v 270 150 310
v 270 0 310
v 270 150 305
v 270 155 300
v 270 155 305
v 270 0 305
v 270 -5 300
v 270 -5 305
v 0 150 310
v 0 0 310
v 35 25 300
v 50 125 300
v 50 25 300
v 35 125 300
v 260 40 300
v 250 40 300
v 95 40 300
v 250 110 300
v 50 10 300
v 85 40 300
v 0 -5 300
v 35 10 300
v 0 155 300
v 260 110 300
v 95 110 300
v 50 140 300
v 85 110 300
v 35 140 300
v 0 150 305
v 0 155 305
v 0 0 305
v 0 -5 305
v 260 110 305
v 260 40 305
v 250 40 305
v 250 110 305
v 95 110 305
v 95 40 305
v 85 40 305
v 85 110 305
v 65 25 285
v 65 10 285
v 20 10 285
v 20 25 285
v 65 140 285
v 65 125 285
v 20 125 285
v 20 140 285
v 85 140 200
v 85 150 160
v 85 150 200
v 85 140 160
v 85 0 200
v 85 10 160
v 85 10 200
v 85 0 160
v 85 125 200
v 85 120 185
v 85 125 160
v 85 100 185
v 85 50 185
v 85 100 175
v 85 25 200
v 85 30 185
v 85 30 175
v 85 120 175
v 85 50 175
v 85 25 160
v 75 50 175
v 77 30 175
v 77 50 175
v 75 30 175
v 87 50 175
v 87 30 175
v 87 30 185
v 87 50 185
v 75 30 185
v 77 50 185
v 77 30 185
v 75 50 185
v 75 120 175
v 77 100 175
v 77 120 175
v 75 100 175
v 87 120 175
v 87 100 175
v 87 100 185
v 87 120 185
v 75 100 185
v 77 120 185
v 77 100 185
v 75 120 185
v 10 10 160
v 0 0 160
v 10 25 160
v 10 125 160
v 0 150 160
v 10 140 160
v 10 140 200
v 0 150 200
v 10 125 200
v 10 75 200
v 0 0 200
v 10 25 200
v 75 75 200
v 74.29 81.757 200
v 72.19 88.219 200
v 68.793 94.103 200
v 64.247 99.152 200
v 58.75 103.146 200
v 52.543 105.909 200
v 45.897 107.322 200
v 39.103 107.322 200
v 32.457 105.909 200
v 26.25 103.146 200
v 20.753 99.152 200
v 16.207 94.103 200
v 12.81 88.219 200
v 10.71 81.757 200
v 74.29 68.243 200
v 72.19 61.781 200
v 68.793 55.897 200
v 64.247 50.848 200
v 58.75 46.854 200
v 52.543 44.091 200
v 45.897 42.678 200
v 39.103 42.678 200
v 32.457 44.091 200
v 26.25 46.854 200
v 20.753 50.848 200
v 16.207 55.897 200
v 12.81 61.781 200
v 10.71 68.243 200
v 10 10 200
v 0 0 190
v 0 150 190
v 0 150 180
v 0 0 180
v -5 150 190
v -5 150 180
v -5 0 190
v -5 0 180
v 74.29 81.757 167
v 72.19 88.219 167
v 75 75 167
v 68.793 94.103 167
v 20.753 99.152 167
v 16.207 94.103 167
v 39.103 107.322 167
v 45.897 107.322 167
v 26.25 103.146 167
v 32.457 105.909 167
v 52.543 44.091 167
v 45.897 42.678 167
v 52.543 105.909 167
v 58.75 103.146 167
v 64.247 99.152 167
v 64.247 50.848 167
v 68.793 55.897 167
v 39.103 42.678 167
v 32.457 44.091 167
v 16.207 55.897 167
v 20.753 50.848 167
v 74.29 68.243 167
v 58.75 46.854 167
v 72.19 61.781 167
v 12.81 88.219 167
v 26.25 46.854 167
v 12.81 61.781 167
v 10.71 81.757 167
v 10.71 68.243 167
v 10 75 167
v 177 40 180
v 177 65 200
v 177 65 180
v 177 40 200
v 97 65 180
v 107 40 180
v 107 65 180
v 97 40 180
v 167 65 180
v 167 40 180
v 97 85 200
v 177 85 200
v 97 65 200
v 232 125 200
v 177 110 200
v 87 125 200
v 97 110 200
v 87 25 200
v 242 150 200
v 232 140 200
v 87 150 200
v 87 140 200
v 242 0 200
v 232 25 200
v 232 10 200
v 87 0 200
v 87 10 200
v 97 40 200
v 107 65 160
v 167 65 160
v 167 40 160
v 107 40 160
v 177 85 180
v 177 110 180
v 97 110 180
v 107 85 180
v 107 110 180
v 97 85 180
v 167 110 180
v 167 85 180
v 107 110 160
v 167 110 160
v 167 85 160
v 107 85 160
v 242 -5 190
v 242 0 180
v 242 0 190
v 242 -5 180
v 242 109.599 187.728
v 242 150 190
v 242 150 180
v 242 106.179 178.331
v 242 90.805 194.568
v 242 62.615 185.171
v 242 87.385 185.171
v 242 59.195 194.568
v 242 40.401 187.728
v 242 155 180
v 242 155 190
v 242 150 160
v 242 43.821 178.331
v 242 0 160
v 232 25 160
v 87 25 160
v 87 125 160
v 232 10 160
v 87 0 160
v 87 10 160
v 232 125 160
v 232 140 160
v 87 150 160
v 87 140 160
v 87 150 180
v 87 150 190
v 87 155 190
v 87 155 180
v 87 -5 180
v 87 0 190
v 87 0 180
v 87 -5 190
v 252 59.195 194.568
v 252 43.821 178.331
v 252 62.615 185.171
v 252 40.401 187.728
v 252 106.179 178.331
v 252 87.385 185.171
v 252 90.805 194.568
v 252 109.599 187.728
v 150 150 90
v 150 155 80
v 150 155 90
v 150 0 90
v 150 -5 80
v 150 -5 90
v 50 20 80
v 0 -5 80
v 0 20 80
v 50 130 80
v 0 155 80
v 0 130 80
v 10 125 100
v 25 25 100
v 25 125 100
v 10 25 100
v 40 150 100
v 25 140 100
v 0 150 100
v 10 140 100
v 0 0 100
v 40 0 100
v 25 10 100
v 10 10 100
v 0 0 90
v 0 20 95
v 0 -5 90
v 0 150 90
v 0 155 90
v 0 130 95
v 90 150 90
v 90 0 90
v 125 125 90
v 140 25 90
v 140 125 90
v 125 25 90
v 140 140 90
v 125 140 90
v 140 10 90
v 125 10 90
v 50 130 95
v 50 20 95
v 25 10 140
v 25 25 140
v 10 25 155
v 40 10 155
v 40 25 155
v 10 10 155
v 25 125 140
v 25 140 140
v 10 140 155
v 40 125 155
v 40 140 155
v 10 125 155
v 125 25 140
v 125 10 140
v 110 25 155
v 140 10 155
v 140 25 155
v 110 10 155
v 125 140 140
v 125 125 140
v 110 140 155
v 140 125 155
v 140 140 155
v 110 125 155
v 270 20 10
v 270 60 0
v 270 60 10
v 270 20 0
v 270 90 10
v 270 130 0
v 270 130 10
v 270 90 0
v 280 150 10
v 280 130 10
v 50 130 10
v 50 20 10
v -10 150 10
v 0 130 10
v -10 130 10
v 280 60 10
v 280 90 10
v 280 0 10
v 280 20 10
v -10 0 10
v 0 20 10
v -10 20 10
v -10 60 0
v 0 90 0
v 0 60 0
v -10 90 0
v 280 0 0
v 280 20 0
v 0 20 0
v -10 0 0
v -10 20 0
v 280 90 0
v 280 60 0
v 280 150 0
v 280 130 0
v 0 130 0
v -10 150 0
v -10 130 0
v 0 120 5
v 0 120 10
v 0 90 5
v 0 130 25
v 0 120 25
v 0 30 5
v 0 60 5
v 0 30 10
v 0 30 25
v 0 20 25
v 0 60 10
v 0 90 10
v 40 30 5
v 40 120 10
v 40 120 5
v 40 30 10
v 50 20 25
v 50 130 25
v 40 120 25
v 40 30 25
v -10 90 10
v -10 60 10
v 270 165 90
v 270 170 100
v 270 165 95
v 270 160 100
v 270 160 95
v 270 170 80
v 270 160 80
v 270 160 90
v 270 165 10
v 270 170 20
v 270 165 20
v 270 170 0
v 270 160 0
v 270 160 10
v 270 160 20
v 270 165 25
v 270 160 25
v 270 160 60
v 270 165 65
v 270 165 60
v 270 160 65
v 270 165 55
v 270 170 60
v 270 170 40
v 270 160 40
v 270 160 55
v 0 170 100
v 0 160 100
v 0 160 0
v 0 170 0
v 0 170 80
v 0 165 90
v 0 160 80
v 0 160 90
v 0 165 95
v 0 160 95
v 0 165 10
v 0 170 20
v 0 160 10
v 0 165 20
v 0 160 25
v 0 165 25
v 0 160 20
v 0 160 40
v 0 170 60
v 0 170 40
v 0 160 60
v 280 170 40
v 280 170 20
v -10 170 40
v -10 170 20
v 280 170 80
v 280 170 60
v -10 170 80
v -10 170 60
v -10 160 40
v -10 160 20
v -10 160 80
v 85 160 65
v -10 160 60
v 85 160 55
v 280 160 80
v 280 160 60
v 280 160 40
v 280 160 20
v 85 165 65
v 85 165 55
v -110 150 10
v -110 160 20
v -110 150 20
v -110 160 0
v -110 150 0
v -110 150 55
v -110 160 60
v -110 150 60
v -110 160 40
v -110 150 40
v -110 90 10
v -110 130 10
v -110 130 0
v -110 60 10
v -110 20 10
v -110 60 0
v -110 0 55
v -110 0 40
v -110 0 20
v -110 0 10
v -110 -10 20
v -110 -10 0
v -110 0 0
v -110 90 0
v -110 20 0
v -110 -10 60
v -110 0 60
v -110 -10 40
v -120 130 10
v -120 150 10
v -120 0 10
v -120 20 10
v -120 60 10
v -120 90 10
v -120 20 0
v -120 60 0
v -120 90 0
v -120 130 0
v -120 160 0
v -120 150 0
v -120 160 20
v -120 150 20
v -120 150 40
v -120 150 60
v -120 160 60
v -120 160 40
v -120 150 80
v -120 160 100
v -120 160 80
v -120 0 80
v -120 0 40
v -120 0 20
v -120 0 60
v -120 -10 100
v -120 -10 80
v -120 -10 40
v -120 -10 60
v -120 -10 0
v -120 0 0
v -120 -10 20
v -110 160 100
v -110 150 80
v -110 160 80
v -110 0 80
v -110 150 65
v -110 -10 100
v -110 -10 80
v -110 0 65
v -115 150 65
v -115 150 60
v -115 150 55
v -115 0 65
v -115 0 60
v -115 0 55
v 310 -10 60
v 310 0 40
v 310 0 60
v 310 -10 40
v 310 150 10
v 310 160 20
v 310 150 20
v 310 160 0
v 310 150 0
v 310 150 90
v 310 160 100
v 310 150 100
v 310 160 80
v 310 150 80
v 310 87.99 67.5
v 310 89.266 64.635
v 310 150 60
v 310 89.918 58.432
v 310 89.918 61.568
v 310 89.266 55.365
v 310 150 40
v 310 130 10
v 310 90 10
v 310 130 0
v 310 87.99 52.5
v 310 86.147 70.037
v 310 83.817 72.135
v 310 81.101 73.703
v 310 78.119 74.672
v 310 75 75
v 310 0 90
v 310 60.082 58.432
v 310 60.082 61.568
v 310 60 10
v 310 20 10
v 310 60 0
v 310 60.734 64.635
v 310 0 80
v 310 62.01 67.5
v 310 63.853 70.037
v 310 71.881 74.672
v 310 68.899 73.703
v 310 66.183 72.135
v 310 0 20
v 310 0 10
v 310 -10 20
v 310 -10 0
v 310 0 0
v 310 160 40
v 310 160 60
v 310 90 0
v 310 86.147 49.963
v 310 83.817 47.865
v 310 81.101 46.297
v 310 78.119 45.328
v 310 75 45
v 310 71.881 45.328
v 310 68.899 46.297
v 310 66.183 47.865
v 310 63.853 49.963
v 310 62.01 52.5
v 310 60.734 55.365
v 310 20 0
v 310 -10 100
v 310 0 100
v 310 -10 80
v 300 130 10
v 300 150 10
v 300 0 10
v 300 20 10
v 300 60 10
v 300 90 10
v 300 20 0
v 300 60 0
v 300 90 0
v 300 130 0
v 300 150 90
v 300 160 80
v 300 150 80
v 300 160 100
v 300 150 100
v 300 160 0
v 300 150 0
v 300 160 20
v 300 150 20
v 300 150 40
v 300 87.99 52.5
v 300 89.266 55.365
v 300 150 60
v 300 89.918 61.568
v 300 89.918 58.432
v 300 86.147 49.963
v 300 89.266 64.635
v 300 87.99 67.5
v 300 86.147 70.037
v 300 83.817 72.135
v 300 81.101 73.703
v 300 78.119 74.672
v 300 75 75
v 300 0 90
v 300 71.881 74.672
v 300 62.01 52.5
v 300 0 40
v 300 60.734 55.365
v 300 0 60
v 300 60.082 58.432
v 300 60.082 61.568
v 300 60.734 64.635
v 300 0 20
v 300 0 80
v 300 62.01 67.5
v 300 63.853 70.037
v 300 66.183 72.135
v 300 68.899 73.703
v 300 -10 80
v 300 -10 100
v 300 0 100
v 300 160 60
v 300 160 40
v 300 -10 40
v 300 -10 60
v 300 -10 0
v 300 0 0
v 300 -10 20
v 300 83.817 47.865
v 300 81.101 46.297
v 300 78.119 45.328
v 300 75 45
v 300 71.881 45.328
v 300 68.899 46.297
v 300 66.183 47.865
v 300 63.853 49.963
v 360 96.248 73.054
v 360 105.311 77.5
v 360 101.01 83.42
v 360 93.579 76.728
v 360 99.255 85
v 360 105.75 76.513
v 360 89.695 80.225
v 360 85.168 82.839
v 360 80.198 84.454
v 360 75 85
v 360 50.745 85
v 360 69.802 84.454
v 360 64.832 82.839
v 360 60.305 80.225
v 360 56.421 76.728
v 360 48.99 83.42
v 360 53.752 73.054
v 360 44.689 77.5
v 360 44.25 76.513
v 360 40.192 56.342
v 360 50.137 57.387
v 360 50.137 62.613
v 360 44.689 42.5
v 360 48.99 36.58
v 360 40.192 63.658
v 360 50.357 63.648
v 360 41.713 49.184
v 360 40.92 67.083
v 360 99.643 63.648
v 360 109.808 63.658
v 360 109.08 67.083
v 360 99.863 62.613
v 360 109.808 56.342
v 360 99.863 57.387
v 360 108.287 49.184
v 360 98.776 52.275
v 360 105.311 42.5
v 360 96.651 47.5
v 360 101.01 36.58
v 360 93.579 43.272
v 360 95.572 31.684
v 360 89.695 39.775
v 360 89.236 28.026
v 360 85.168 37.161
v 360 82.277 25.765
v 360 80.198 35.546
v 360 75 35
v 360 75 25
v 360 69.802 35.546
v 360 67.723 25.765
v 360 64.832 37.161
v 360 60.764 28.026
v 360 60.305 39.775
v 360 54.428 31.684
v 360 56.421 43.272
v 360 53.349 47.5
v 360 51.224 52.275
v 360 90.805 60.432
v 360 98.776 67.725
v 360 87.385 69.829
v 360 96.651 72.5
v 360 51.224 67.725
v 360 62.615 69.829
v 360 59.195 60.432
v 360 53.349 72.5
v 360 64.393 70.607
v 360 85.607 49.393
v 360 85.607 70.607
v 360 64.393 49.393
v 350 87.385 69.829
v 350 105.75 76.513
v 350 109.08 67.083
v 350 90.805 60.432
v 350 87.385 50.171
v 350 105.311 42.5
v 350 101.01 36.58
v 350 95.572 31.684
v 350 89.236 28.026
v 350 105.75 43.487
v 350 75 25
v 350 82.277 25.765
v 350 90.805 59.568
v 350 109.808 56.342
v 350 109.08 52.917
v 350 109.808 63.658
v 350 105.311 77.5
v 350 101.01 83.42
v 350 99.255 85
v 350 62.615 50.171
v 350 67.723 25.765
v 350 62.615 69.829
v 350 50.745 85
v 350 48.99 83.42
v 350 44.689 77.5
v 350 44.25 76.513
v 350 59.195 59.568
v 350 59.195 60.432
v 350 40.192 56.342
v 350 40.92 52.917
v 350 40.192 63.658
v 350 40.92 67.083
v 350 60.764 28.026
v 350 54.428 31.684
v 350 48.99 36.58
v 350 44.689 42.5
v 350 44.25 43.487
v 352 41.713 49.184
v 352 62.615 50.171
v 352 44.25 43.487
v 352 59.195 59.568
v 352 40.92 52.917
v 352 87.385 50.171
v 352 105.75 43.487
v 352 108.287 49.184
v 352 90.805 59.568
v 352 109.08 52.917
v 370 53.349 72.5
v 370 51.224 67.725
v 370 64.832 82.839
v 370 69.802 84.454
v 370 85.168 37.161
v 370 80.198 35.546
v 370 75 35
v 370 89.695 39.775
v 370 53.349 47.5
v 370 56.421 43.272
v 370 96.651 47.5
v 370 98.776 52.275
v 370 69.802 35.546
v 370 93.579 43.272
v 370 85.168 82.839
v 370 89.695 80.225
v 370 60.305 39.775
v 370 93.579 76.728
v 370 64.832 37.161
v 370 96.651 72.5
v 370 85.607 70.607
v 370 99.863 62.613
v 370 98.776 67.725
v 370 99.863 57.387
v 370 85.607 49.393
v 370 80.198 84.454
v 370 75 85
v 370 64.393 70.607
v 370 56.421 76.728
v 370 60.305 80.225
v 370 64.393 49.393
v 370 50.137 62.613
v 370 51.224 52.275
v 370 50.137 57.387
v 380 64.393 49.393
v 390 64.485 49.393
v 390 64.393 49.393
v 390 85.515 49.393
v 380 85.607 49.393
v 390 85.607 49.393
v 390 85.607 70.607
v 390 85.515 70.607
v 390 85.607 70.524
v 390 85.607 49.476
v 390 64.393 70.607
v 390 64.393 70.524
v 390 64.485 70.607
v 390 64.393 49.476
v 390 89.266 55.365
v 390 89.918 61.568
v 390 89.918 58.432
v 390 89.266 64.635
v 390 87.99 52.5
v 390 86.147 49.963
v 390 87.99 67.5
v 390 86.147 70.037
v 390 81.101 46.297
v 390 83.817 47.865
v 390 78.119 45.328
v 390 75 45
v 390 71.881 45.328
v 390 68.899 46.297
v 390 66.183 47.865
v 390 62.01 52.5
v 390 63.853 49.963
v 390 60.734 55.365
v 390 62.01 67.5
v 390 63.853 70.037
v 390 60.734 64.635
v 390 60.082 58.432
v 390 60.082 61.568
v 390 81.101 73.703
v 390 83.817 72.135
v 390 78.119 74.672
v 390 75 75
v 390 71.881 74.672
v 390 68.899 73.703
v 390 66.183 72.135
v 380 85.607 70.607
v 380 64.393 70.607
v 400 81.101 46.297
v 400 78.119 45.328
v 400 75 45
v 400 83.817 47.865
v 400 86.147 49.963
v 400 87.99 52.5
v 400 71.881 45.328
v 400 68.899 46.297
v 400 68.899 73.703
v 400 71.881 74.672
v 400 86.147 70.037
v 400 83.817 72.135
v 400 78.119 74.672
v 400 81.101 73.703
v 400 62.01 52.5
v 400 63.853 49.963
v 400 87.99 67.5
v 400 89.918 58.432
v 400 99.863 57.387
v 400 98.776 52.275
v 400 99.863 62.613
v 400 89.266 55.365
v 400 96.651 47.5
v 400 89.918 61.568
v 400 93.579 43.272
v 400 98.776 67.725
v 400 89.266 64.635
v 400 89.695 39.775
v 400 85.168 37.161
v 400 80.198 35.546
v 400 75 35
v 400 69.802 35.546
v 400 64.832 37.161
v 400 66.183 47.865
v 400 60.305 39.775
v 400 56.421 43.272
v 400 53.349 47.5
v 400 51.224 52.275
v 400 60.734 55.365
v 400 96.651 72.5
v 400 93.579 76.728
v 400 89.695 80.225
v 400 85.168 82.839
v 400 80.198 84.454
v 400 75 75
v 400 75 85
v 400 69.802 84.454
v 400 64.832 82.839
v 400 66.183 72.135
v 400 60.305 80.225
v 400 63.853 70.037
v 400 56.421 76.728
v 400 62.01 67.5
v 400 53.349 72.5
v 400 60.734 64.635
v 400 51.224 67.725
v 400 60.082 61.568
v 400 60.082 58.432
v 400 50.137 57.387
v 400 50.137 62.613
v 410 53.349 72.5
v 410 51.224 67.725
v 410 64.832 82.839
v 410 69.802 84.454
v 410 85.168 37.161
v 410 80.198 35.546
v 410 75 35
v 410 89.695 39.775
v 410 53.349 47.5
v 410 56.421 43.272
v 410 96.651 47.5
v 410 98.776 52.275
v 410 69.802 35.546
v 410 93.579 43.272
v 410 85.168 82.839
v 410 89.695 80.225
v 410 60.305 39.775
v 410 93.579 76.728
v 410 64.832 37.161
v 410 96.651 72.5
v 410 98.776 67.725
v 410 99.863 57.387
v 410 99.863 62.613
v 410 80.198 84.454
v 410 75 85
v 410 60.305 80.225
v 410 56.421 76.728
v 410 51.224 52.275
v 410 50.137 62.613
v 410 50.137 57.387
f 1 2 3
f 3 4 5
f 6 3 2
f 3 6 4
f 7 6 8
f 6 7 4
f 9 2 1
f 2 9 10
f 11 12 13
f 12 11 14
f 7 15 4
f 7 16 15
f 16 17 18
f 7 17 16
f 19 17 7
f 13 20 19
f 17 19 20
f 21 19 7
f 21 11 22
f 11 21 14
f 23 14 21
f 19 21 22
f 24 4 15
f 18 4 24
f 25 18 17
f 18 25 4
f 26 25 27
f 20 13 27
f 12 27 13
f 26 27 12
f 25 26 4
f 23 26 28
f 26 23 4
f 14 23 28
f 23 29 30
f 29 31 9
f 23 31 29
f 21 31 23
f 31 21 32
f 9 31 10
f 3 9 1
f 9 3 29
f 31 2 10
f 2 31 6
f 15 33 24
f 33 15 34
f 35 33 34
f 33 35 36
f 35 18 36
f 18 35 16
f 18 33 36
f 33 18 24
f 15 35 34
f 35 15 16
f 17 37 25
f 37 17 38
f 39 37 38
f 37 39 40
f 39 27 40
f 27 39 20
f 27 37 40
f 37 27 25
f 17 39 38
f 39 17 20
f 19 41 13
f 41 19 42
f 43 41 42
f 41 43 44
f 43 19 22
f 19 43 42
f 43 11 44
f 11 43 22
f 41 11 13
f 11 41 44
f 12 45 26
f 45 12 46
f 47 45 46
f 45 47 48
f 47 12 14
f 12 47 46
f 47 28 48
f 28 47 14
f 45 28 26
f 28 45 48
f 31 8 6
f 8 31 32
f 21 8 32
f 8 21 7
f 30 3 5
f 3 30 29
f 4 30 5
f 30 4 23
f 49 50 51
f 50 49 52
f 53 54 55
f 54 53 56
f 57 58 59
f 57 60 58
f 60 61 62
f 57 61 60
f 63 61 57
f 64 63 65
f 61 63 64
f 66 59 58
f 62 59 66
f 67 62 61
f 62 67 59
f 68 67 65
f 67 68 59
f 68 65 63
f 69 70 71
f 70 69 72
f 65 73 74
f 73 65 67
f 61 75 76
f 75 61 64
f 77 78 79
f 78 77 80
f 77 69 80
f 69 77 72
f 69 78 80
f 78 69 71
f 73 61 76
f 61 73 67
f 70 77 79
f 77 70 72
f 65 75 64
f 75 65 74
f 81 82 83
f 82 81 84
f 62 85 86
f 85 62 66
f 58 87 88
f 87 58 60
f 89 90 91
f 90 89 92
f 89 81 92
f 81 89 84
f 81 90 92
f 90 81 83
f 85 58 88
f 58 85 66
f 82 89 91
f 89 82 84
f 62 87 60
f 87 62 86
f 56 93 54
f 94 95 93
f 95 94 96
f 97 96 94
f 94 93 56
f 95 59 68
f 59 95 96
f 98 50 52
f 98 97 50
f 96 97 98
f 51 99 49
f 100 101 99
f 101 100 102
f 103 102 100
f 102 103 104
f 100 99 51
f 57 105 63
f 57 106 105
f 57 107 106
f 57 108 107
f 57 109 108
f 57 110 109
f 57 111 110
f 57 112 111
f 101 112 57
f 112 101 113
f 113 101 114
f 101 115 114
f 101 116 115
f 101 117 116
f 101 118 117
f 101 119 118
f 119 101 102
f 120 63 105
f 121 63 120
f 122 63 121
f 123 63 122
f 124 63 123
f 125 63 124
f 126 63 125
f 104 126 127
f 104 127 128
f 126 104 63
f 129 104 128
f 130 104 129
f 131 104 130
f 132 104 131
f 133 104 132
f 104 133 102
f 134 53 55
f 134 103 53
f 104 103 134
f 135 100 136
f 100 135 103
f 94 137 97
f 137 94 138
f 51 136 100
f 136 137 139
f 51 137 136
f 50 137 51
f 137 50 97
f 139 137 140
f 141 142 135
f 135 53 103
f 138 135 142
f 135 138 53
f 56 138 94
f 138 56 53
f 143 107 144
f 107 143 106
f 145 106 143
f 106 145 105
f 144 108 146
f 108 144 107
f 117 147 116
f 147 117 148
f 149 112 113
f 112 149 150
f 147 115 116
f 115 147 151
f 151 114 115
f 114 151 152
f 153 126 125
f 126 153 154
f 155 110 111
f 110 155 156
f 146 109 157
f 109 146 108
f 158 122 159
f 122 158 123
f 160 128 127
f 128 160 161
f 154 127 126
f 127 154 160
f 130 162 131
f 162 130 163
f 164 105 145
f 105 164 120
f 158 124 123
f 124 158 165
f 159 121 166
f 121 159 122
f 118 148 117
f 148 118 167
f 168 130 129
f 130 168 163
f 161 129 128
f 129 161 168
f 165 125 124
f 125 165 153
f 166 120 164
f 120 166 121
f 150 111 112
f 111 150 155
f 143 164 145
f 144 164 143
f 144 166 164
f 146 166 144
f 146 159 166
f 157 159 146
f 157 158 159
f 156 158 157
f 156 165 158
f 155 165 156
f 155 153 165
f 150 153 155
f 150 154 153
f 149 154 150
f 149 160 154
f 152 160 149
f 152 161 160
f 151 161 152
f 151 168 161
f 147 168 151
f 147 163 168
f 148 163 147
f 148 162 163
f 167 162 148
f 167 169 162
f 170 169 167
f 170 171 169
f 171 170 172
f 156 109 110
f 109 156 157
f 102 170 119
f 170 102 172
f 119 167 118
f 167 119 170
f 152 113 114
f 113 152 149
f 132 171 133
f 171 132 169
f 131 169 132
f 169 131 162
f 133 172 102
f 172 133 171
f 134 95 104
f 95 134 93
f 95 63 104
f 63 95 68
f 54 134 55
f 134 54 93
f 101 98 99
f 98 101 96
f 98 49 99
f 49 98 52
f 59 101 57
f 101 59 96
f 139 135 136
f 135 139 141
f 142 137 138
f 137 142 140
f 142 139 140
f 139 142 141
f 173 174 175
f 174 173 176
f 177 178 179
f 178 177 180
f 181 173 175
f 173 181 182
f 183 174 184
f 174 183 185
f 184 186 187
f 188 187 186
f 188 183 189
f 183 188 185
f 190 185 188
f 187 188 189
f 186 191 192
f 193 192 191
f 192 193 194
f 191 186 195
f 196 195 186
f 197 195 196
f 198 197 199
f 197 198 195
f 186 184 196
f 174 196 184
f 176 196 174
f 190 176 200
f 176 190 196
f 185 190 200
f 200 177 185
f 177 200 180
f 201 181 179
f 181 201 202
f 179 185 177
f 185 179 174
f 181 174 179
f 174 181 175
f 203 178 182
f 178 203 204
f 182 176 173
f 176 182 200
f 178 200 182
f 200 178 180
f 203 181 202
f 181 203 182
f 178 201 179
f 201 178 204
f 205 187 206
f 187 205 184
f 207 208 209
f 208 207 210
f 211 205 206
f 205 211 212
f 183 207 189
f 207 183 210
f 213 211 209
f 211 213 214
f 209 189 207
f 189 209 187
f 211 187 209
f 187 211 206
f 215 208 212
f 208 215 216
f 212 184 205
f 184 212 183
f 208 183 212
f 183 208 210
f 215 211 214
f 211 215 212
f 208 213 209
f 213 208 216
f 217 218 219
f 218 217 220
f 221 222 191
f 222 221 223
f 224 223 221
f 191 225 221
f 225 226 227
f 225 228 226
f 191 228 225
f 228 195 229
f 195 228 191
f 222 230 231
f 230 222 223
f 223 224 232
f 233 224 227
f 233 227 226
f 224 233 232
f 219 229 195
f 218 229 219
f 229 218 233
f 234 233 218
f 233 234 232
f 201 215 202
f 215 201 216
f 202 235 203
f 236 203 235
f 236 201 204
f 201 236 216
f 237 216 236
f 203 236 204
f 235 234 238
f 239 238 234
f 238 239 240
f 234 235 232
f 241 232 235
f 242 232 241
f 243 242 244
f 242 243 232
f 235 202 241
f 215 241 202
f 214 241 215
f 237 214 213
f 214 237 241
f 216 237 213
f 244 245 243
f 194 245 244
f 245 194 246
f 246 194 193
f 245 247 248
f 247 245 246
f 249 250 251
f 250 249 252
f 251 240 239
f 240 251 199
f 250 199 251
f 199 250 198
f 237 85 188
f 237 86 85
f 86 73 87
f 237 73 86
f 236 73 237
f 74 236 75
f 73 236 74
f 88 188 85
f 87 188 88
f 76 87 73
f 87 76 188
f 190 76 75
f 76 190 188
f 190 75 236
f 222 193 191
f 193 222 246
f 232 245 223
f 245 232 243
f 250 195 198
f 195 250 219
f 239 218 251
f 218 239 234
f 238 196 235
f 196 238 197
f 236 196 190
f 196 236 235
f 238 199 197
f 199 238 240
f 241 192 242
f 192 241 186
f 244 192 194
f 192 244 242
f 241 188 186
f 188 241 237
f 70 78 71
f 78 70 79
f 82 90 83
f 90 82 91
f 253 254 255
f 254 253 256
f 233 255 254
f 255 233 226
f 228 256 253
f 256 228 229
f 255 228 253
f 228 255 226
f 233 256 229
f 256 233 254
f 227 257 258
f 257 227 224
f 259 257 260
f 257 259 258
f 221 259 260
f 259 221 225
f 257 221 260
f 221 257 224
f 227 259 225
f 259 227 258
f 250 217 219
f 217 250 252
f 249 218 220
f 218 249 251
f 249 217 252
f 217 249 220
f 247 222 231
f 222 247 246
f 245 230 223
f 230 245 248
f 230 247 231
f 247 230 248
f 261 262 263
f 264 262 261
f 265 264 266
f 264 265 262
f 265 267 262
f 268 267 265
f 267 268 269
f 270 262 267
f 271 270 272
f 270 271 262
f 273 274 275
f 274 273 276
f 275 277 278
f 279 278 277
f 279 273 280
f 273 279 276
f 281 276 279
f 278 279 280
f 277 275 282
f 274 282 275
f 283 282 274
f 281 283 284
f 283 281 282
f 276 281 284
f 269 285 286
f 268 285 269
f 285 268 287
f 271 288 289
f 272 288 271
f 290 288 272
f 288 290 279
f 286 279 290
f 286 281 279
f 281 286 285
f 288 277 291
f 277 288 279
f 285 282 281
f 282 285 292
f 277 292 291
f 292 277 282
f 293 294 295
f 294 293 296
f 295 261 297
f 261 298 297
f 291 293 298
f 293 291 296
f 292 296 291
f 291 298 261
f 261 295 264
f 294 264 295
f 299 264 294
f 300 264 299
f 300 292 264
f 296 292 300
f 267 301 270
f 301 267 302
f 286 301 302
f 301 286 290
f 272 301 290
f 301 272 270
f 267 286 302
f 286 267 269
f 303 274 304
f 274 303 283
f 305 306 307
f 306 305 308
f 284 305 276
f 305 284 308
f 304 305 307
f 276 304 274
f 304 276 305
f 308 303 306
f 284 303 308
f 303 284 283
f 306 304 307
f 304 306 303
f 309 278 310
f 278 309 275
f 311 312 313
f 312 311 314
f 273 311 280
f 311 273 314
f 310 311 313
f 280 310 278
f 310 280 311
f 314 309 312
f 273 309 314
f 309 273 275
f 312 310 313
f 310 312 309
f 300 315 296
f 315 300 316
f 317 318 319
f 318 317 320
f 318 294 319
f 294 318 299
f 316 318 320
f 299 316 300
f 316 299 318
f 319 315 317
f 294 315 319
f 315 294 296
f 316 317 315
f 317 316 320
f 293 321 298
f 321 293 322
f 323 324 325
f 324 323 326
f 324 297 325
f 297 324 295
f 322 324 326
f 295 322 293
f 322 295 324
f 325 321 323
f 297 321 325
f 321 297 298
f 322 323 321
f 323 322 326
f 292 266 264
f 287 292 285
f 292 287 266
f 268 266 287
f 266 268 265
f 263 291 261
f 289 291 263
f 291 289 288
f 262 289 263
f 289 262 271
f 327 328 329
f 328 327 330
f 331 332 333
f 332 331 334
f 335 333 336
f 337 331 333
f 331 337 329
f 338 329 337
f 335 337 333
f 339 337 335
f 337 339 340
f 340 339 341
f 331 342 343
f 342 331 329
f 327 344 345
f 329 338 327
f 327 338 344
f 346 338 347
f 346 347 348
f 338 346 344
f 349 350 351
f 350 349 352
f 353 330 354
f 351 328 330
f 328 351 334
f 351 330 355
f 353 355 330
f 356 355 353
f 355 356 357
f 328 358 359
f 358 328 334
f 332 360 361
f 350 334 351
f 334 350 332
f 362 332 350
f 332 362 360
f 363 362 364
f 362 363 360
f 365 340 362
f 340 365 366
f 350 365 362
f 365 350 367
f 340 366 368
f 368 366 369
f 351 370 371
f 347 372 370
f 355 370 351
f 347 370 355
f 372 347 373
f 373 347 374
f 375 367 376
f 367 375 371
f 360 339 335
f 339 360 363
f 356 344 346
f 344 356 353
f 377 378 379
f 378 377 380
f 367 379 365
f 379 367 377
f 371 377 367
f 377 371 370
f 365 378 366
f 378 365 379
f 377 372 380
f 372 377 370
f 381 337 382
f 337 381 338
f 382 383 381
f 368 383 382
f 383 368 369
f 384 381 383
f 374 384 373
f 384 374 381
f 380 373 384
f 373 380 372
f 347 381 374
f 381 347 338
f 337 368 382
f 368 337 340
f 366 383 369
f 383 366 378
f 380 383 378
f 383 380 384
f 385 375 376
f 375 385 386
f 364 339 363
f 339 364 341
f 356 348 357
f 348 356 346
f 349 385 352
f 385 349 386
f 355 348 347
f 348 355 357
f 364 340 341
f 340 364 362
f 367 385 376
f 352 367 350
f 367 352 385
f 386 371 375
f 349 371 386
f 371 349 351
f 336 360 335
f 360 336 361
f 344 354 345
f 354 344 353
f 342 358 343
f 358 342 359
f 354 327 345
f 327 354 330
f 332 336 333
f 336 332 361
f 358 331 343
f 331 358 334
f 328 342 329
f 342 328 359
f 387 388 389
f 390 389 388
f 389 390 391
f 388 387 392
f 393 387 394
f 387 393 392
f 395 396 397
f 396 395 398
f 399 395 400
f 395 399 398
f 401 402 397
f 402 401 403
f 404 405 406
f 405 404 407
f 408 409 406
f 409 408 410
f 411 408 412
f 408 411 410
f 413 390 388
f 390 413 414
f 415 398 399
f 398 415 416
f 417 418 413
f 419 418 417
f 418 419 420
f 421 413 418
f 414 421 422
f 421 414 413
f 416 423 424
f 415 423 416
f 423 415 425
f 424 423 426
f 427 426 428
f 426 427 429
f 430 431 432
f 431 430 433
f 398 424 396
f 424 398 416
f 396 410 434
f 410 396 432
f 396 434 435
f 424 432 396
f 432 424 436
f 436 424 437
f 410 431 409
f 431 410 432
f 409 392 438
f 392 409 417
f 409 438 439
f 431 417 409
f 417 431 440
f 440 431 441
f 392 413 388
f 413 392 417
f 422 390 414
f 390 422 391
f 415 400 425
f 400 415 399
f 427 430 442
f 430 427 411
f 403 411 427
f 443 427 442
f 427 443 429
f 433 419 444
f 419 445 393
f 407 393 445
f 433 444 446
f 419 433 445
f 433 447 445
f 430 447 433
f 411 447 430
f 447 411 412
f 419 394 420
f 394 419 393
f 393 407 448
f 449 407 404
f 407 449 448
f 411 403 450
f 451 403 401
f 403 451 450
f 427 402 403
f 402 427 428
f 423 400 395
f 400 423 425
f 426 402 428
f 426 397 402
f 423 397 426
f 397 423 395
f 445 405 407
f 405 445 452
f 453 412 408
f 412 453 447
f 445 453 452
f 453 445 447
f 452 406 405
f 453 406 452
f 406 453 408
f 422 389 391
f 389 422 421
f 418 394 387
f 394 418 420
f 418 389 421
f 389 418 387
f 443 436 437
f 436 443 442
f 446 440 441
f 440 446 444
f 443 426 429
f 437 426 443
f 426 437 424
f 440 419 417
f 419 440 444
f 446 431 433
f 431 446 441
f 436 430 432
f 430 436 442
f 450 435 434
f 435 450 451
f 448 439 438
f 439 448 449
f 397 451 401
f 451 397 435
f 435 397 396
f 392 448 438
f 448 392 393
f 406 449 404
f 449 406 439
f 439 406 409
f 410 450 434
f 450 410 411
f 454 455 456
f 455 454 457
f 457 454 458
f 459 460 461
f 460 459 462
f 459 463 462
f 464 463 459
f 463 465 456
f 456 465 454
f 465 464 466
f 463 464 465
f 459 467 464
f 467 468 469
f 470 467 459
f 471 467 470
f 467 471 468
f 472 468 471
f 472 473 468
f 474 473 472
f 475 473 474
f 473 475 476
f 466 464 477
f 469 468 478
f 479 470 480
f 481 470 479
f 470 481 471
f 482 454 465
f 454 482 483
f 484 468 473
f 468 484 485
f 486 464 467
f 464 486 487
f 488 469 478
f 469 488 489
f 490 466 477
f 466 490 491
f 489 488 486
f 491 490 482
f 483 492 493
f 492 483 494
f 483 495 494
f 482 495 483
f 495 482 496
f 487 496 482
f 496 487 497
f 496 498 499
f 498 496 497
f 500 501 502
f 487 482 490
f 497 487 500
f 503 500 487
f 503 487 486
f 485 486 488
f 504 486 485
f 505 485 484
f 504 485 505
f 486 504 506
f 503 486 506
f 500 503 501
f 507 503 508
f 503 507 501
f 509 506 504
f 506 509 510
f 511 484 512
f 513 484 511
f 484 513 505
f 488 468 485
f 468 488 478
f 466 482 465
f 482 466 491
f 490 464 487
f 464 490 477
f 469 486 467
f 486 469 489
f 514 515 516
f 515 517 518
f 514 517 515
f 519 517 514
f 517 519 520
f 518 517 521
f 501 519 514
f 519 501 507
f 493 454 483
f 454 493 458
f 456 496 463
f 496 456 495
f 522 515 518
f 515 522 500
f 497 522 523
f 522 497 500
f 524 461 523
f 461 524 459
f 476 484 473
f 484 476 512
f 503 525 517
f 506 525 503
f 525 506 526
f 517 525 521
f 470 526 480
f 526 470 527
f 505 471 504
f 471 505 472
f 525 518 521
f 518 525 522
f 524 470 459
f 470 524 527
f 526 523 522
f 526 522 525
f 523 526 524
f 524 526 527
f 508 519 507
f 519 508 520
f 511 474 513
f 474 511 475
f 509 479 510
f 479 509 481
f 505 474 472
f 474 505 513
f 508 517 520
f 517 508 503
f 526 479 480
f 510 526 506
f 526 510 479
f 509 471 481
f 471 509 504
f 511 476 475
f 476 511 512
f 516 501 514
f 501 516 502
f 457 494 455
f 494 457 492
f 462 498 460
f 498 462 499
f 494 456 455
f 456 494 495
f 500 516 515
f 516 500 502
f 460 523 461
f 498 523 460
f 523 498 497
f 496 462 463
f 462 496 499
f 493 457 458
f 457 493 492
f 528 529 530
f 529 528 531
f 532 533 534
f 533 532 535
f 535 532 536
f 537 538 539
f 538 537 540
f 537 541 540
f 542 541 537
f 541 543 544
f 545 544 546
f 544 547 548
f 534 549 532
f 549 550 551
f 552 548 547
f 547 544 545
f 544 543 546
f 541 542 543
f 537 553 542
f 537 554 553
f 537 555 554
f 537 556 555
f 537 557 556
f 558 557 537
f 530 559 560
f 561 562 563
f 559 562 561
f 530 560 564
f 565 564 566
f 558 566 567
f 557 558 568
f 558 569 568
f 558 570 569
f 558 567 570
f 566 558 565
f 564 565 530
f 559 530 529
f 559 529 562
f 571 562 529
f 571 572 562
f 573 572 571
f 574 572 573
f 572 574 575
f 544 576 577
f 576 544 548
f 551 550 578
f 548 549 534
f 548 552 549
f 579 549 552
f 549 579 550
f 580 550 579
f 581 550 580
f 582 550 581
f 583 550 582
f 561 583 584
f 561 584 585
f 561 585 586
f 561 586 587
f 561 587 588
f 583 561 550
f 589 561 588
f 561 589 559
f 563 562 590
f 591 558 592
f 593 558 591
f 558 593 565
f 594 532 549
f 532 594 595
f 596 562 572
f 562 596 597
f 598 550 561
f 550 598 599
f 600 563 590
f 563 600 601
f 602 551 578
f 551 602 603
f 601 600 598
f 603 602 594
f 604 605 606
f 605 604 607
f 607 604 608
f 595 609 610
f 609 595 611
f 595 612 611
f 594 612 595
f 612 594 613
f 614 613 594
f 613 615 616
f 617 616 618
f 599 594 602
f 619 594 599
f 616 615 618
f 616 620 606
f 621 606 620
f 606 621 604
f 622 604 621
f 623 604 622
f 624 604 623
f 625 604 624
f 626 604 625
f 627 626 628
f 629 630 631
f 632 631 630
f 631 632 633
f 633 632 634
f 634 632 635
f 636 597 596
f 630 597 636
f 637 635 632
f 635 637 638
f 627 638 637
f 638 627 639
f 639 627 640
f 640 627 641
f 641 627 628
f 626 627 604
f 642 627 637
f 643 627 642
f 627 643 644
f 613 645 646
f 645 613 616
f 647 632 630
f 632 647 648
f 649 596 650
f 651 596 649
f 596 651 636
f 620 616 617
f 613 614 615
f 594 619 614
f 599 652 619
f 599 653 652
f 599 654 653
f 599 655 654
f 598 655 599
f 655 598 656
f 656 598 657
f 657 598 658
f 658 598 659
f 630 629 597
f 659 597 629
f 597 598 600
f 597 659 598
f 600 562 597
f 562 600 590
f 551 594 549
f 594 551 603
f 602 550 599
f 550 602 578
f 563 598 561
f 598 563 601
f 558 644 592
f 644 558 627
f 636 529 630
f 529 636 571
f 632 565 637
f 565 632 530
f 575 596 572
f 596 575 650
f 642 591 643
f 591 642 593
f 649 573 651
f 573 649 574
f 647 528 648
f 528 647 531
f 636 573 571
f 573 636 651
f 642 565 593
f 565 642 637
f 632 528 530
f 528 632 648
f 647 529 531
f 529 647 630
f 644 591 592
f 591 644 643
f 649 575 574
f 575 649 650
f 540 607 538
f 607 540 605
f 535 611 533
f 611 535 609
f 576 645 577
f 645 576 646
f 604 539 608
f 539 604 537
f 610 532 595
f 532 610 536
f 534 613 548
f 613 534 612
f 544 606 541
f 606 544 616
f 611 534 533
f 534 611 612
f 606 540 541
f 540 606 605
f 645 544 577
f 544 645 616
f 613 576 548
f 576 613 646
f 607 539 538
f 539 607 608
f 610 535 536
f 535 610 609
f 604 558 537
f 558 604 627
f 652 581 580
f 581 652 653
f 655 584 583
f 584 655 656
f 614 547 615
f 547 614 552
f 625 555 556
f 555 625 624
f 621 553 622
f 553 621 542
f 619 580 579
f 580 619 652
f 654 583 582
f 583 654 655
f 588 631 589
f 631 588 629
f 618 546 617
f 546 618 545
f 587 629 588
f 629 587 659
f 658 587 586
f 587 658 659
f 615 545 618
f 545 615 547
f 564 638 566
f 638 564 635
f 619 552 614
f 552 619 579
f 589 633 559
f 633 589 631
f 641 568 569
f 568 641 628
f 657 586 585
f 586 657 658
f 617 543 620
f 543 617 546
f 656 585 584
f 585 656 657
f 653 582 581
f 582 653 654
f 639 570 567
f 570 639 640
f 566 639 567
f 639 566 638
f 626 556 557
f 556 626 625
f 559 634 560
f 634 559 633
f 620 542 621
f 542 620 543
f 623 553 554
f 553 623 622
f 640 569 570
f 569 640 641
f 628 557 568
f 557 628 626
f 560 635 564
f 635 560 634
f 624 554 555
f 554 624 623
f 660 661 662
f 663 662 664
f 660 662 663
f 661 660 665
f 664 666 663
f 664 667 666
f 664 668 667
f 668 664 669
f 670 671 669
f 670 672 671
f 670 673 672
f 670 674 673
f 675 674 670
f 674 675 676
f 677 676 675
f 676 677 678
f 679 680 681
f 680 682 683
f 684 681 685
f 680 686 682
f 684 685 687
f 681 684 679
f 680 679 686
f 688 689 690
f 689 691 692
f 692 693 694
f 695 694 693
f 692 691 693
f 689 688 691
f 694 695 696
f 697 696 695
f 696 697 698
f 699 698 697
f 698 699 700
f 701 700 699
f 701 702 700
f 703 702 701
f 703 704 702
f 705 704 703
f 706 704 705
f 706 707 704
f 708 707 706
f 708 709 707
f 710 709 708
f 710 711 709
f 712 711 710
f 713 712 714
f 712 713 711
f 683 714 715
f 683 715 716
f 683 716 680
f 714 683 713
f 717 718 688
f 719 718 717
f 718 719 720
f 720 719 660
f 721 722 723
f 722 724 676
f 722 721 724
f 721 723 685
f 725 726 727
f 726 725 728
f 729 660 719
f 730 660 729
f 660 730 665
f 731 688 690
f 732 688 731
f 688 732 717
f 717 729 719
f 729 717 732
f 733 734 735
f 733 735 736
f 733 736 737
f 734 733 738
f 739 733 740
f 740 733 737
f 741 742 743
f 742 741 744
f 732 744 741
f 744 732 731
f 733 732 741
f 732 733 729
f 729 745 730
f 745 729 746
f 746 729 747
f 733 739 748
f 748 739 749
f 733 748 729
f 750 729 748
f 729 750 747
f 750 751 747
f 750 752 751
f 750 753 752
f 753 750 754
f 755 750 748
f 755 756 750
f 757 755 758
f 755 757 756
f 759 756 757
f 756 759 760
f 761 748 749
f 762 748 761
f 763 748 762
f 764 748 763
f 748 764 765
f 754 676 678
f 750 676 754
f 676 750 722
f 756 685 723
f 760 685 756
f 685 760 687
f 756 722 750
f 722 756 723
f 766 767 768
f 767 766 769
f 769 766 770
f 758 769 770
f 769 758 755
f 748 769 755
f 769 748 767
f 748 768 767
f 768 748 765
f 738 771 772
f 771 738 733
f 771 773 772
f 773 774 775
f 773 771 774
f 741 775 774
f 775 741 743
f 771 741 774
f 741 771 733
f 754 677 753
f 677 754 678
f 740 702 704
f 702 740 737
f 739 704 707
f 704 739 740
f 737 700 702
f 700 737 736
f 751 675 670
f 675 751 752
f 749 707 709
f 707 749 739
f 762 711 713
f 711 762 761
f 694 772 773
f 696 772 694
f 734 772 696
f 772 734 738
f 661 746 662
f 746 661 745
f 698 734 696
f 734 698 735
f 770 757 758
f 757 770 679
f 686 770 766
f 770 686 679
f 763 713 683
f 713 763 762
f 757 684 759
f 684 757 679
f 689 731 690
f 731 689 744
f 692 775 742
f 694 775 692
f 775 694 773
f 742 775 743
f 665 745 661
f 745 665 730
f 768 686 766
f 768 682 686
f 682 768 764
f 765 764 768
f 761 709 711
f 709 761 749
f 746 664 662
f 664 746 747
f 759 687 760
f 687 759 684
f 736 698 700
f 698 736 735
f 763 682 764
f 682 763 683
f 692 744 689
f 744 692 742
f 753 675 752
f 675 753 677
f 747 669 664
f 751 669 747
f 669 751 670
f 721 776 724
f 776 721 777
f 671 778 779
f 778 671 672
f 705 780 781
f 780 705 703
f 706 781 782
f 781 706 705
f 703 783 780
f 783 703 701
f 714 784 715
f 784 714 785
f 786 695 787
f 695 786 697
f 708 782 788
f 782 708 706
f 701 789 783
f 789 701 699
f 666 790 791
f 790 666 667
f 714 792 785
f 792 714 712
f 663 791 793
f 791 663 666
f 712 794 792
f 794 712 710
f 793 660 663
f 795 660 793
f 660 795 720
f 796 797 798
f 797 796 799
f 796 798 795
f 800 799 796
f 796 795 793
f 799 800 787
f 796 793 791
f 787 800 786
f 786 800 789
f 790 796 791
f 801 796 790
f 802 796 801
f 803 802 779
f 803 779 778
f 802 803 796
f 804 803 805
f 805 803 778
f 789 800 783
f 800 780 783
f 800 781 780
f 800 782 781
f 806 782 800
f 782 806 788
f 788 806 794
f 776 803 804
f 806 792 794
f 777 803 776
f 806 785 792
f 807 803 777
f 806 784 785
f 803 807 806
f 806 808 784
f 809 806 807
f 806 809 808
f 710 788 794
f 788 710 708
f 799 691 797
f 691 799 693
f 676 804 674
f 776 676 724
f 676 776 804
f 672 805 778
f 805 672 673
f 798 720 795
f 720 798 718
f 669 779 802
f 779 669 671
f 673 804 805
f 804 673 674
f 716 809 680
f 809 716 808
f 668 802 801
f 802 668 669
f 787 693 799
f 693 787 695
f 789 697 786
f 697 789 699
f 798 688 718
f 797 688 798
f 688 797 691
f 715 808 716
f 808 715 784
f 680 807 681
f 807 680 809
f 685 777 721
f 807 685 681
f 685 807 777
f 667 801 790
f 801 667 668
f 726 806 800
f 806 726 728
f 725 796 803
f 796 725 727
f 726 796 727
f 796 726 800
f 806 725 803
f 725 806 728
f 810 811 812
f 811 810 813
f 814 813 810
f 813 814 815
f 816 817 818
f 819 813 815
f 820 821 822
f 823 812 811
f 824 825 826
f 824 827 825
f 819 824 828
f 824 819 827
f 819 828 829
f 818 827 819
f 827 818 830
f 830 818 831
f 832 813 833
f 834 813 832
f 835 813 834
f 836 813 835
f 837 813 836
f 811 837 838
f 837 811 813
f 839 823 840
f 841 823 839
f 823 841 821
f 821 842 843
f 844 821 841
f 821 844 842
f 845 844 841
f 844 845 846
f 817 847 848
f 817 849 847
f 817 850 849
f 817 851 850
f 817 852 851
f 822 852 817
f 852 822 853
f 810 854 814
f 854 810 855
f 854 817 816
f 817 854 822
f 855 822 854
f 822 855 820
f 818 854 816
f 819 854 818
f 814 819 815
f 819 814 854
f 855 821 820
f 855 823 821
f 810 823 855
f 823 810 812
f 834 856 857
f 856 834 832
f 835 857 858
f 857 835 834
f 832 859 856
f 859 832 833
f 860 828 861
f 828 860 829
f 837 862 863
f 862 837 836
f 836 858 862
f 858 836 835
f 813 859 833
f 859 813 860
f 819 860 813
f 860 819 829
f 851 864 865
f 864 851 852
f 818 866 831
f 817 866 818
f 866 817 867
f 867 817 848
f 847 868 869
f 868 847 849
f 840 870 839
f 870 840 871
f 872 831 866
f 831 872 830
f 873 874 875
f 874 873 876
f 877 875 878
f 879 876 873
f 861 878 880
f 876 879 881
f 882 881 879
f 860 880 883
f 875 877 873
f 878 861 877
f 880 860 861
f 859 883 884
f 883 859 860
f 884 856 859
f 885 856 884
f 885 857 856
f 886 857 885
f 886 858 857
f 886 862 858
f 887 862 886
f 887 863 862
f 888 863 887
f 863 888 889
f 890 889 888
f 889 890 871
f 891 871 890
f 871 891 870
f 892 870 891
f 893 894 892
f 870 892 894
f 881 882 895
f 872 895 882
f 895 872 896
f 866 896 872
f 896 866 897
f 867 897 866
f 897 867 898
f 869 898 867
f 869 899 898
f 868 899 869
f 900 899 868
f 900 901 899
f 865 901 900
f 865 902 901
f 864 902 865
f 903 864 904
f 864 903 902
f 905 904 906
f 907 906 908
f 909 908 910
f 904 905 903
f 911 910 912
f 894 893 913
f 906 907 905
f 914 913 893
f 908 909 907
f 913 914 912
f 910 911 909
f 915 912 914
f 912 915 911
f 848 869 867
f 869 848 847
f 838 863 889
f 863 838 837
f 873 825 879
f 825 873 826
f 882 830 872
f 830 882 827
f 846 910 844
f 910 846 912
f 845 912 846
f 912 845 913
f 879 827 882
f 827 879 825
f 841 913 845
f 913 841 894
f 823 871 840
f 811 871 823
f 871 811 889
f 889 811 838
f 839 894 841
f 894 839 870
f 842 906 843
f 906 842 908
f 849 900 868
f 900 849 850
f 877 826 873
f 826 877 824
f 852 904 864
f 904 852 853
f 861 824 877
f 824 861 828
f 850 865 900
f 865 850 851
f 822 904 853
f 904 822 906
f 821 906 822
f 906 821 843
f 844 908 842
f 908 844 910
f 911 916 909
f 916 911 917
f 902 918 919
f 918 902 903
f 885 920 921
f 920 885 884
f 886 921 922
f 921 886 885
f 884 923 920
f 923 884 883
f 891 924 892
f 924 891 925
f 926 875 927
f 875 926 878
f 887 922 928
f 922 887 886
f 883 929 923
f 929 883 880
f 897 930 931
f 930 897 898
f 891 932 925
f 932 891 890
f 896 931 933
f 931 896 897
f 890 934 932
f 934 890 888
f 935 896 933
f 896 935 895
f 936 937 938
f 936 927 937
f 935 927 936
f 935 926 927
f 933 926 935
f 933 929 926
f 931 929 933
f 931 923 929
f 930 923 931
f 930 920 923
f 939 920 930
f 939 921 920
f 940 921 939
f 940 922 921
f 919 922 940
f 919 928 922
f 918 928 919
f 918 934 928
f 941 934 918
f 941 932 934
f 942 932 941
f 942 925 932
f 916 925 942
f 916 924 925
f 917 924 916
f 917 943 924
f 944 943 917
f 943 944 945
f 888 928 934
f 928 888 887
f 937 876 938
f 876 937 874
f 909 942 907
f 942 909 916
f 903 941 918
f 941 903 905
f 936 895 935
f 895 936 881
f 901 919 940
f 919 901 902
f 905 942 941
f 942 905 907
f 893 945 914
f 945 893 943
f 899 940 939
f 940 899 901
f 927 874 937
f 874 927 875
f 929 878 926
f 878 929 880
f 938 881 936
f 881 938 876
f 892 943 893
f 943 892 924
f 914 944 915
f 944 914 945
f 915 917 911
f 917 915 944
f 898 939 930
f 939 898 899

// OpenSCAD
/* stamp box for shiky's marriage
 * 
 * bouding size 290 * 170 * 100
 */
biL = 270;      // box inner length
biW = 150;      // box inner width
biH = 100;      // box inner height
stampL = 80;    // stamp length
stampW = 25;    // stamp width & height
ipD = 65;       // inkpad diameter
ipH = 38;       // inkpad height
objB = 5;       // object bare height
bt = 10;        // bt thickness
trW=5;          // track with
drH=15;         // dark room height
drW=50;         // dark room width
drOY=20;        // dark room offset
drcL=85;       // dark room cap length
ubOX=10;        // union bar offset x
ubOY=10;        // union bar offset y
ubW=15;         // union bar width
ubH=55;         // union bar height
lkD=70;         // locker diameter(large side)
lkaD=30;        // locker axis diameter
lksD=50;        // locker strip diameter
l1H=bt;         // layer 1 height
l2H=40;         // layer 2 height
l3H=20;         // layer 3 height
l4H=bt;         // layer 4 height
l1tH=l1H-trW;   // layer 1 tenon height
l2tH=bt;        // layer 2 tenon height
l3tH=10;        // layer 3 tenon height
l1tOZ=trW;      // layer 1 tenon offset z
l2tOZ=20;       // layer 2 tenon offset z
l2L=biL-bt*3;   // layer 2 main length
l3L=150;        // layer 3 length

// stamp hole
module stampHole(){
    cube([stampL,stampW,stampW-objB]);
    translate([10,0,stampW-objB]) cube([stampL-20,stampW,30]);
}

// union bar
module unionbar(h=ubH,toleft=false){
    if (!toleft){
        color("red"){
            cube([ubW,ubW,h]);
            translate([ubW+ubW,ubW,h]) rotate([-90,0,180]) linear_extrude(ubW) polygon([[0,0],[ubW,ubW],[ubW,0]]);
        }
    }
    else
    {
        translate([ubW,ubW,0]) rotate([0,0,180]) unionbar(h,false);
    }
}

// union bar locker (triangle)
module ublocker(toleft=false){
    translate([0,ubW,0]) rotate([-90,180,180]) linear_extrude(ubW) polygon([[0,0],[ubW,ubW],[ubW*2,ubW],[ubW*3,0]]);
}

// 2nd lock slot (2 rotate cube)
module lock2slot(h=bt){
    rotate([0,0,20]) translate([-5,-35,0]) cube([bt,20,h]);
    rotate([0,0,-20]) translate([-5,15,0]) cube([bt,20,h]);
}

// locker connect object
module lockerslot(){
    w=sqrt(lkaD*lkaD/2);
    translate([0,0,bt/2]) cube([w,w,bt],true);
}

// lock left part (inside)
module lockerl(){
    difference(){
        cylinder(d=lkD,h=bt);
        // lock1
        translate([-lkD/2,-lkD/2,0]) cube([bt,lkD,20]);
        // lock2
        rotate(180,0,0) lock2slot();
        // positioner
        lock2slot(2);
    }
    difference(){
        translate([0,0,bt]) cylinder(d=50,h=bt);
        translate([0,0,bt]) lockerslot();
    }
}

// locker right part (outside)
module lockerr(){
    translate([0,0,-bt]) lockerslot();
    translate([0,0,0]) cylinder(d=lkaD,h=bt);
    translate([0,0,bt]) cylinder(d=50,h=bt);
}

// box locker
module locker(){
    color("lightgreen") rotate([0,90,0]){
        lockerl();
        translate([0,0,bt*2+20]) lockerr();
    }
}

// locker in on module (old design)
module lockero(){
    color("lightgreen") rotate([0,90,0]){
        difference(){
            cylinder(d=lkD,h=bt);
            // lock1
            translate([-lkD/2,-lkD/2,0]) cube([bt,lkD,20]);
            // lock2
            rotate(180,0,0) lock2slot();
            // positioner
            lock2slot(2);
        }
        translate([0,0,bt]) cylinder(d=50,h=bt);
        translate([0,0,bt*2]) cylinder(d=lkaD,h=bt);
        translate([0,0,bt*3]) cylinder(d=50,h=bt);
    }
}


module layer1(){
    difference(){
        cube([biL,biW,l1H]);
        // lock slot
        translate([biL-bt*2,(biW-lkD)/2,0]) cube([bt,lkD,trW]);
        // lock slot 2
        translate([l2L-ubOX*2-(l3L-ubOX*2)-5,(biW-lkD)/2,0]) cube([bt,lkD,trW]);
    }
    
    // union bar pusher
    ubpOX=20;
    translate([ubpOX,ubOY,-ubW])         ublocker();
    translate([ubpOX,biW-ubOY-ubW,-ubW]) ublocker();
    
    // tenon
    translate([0,-trW,0]) cube([biL,trW,l1tH]);
    translate([0,biW,0])  cube([biL,trW,l1tH]);
}
// layer 2 connect object
module layer2slot(){
    translate([0,30,15])     cube([10,20,10]);
    translate([0,biW-50,15]) cube([10,20,10]);
}

// layer 2 left part
module layer2l(){
    mirror([0,0,1]) union(){
        difference(){
            cube([drcL,biW,l2H]);
            // inkpad hole
            ipOX = ipD/2+10;
            ipOY = (biW - ipD) / 2;
            translate([ipOX,ipOY+ipD/2,0]) cylinder(d=ipD,h=ipH-objB);
            // union bar hole
            ubhW=l2L-ubOX*2;
            translate([ubOX,ubOY,0]) cube([ubhW,ubW,drcL]);
            translate([ubOX,biW-ubOY-ubW,0]) cube([ubhW,ubW,drcL]);
            // slot
            translate([drcL-10,0,0]) layer2slot();
        }
    }
    // tenon
    tOZ=20;
    translate([-trW,0,-tOZ]) cube([trW,biW,l2tH]);
    //translate([0,-trW,-tOZ]) cube([bt,trW,l2tH]);
    //translate([0,biW,-tOZ]) cube([lbt,trW,l2tH]);
}

module layer2r(){
    mirror([0,0,1]) union(){
        difference(){
            cube([l2L-drcL,biW,l2H]);
            // stamp hole
            sOX = 10;  // 20 between inkpad and stamp
            sOY = (biW-stampW*2-20)/2; // 20 between two stamps
            translate([sOX,sOY,0]) stampHole();
            translate([sOX,biW-sOY-stampW,0]) stampHole();
            // union bar hole
            ubhW=l2L-ubOX-drcL;
            translate([0,ubOY,0]) cube([ubhW,ubW,l2H]);
            translate([0,biW-ubOY-ubW,0]) cube([ubhW,ubW,l2H]);
        }
        translate([-10,0,0]) layer2slot();
    }
    // tenon
    tOZ=20;
    translate([0,-trW,-tOZ]) cube([l2L-drcL,trW,l2tH]);
    translate([0,biW,-tOZ]) cube([l2L-drcL,trW,l2tH]);
    // lock tenon
    color("green") translate([l2L-drcL,75,-5]) rotate([0,90,0]) lock2slot();
}

module layer2(){
    layer2l();
    translate([drcL,0,0]) layer2r();
}
module layer2o(){
    // layer plane, base below (xy)
    mirror([0,0,1]) union(){
        difference(){
            cube([l2L,biW,l2H]);
            // inkpad hole
            ipOX = ipD/2+10;
            ipOY = (biW - ipD) / 2;
            translate([ipOX,ipOY+ipD/2,0]) cylinder(d=ipD,h=ipH-objB);
            // stamp hole
            sOX = ipOX+ipD/2+20;  // 20 between inkpad and stamp
            sOY = (biW-stampW*2-20)/2; // 20 between two stamps
            translate([sOX,sOY,0]) stampHole();
            translate([sOX,biW-sOY-stampW,0]) stampHole();
            // union bar hole
            ubhW=l2L-ubOX*2;
            translate([ubOX,ubOY,0]) cube([ubhW,ubW,l2H]);
            translate([ubOX,biW-ubOY-ubW,0]) cube([ubhW,ubW,l2H]);
        }
    }
    // tenon
    tOZ=20;
    translate([-trW,0,-tOZ]) cube([trW,biW,l2tH]);
    translate([drcL,-trW,-tOZ]) cube([l2L-drcL,trW,l2tH]);
    translate([drcL,biW,-tOZ]) cube([l2L-drcL,trW,l2tH]);
    // lock tenon
    color("green") translate([l2L,75,-5]) rotate([0,90,0]) lock2slot();
}

module layer3(){
    sO=40;  // slope offset
    sH=10;  // slop height
    sW=50; // slop width
    
    // layer plane, base below (xy)
    mirror([0,0,1]) union(){
        difference(){
            cube([l3L,biW,l3H]);
            translate([sO,biW,0]) rotate([90,0,0]) linear_extrude(biW) polygon([[0,0],[sW,0],[sW,sH]]);
            translate([sO+sW,0,0]) cube([l3L-sW-sO,biW,sH]);
            
            //translate([0,50]) cube([l3L,30,l3H]);
            // dark room
            translate([0,drOY,l3H-drH]) cube([drW,biW-drOY*2,drH]);
        }
    }
    // union bar, base on (xy)
    translate([ubOX,ubOY,0])                  unionbar(ubH,false);
    translate([ubOX,biW-ubOY-ubW,0])          unionbar(ubH,false);
    translate([l3L-ubOX-ubW,ubOY,-sH])        unionbar(ubH+l3H-sH,true);
    translate([l3L-ubOX-ubW,biW-ubOY-ubW,-sH])unionbar(ubH+l3H-sH,true);
    
    // tenon
    translate([0,-trW,-l3H]) cube([l3L,trW,l3tH]);
    translate([0,biW,-l3H])  cube([l3L,trW,l3tH]);
}

module layer4(){
    difference(){
        cube([biL,biW,l4H]);
        translate([0,drOY+bt,5]) cube([drW-bt,biW-drOY*2-bt*2,5]);
    }
    // dark room field
    color("lightblue"){
        translate([0,drOY,l4H]) cube([drW,bt,drH]);
        translate([0,biW-drOY-bt,l4H]) cube([drW,bt,drH]);
        translate([drW-bt,drOY+bt,l4H]) cube([bt,biW-drOY*2-bt*2,drH]);
    }
    
    translate([-bt,0,0]) difference(){
        cube([bt,biW,bt]);
        wslot();
    }
    translate([biL,0,0]) difference(){
        cube([bt,biW,bt]);
        wslot();
    }
}

module wslot(){
    difference(){
        cube([bt,biW,bt]);
        translate([0,0,0]) cube([bt,bt*2,bt]);
        translate([0,biW-bt*2,0]) cube([bt,bt*2,bt]);
        translate([0,bt*6,0]) cube([bt,biW-bt*12,bt]);
    }
}

module hslot(){
    difference(){
        cube([bt,bt,biH]);
        translate([0,0,0]) cube([bt,bt,bt*2]);
        translate([0,0,biH-bt*2]) cube([bt,bt,bt*2]);
        translate([0,0,bt*4]) cube([bt,bt,biH-bt*8]);
    }
}

module layerF(){
    mirror([0,1,0]) layerB();
}

// layer back
module layerB(){
    difference(){
        cube([biL,bt,biH]);
        l3sH=5;    // layer 3 slot space height
        translate([0,0,bt])             cube([biL,trW,l3tH+l3sH]);
        translate([drcL,0,l4H+l3H+l3sH+l2H-l2tOZ])    cube([biL-drcL,trW,l2tH]);
        translate([0,0,biH-l1tOZ-l1tH]) cube([biL,trW,l1tH]);
    }
    translate([-bt,0,0]) hslot();
    translate([biL,0,0]) hslot();
}

module layerL(){
    translate([0,0,bt]) difference(){
        cube([bt,biW,biH-bt]);
        l3sH=5;    // layer 3 slot space height
        translate([trW,0,l4H+l3H+l3sH+l2H-l2tOZ-bt]) cube([trW,biW,l2tH]);
    }
    // border
    wslot();
    translate([0,-bt,0]) difference(){
        cube([bt,bt,biH]);
        hslot();
    }
    translate([0,biW,0]) difference(){
        cube([bt,bt,biH]);
        hslot();
    }
}

module layerR(){
    translate([0,0,bt]) difference(){
        cube([bt,biW,biH-bt*2]);
        translate([0,biW/2,biH-bt*2-l1tH-lksD/2]) rotate([0,90,0]) cylinder(d=lkaD,h=bt+1);
    }
    
    wslot();
    translate([0,-bt,0]) difference(){
        cube([bt,bt,biH]);
        hslot();
    }
    translate([0,biW,0]) difference(){
        cube([bt,bt,biH]);
        hslot();
    }
}

// move to end position
//translate([190,0,310]) layer1();
//translate([0,0,300]) layer2();
//translate([110,0,255]) layer3();

// move to stamp position
//translate([105,0,310]) layer1();
//translate([25,0,255]) layer3();

// combination position
//translate([165,0,90]) layer1();
//translate([0,0,75]) layer2();
//translate([90,0,30]) layer3();

// split position
translate([0,0,300]) layer1();
translate([0,0,200]) layer2l();
translate([drcL+2,0,200]) layer2r();
translate([0,0,100]) layer3();
layer4();
%translate([0,-100,0]) layerF();
translate([0,160,0]) layerB();
translate([-120,0,0]) layerL();
translate([300,0,0]) layerR();

translate([350,75,60]) locker();
